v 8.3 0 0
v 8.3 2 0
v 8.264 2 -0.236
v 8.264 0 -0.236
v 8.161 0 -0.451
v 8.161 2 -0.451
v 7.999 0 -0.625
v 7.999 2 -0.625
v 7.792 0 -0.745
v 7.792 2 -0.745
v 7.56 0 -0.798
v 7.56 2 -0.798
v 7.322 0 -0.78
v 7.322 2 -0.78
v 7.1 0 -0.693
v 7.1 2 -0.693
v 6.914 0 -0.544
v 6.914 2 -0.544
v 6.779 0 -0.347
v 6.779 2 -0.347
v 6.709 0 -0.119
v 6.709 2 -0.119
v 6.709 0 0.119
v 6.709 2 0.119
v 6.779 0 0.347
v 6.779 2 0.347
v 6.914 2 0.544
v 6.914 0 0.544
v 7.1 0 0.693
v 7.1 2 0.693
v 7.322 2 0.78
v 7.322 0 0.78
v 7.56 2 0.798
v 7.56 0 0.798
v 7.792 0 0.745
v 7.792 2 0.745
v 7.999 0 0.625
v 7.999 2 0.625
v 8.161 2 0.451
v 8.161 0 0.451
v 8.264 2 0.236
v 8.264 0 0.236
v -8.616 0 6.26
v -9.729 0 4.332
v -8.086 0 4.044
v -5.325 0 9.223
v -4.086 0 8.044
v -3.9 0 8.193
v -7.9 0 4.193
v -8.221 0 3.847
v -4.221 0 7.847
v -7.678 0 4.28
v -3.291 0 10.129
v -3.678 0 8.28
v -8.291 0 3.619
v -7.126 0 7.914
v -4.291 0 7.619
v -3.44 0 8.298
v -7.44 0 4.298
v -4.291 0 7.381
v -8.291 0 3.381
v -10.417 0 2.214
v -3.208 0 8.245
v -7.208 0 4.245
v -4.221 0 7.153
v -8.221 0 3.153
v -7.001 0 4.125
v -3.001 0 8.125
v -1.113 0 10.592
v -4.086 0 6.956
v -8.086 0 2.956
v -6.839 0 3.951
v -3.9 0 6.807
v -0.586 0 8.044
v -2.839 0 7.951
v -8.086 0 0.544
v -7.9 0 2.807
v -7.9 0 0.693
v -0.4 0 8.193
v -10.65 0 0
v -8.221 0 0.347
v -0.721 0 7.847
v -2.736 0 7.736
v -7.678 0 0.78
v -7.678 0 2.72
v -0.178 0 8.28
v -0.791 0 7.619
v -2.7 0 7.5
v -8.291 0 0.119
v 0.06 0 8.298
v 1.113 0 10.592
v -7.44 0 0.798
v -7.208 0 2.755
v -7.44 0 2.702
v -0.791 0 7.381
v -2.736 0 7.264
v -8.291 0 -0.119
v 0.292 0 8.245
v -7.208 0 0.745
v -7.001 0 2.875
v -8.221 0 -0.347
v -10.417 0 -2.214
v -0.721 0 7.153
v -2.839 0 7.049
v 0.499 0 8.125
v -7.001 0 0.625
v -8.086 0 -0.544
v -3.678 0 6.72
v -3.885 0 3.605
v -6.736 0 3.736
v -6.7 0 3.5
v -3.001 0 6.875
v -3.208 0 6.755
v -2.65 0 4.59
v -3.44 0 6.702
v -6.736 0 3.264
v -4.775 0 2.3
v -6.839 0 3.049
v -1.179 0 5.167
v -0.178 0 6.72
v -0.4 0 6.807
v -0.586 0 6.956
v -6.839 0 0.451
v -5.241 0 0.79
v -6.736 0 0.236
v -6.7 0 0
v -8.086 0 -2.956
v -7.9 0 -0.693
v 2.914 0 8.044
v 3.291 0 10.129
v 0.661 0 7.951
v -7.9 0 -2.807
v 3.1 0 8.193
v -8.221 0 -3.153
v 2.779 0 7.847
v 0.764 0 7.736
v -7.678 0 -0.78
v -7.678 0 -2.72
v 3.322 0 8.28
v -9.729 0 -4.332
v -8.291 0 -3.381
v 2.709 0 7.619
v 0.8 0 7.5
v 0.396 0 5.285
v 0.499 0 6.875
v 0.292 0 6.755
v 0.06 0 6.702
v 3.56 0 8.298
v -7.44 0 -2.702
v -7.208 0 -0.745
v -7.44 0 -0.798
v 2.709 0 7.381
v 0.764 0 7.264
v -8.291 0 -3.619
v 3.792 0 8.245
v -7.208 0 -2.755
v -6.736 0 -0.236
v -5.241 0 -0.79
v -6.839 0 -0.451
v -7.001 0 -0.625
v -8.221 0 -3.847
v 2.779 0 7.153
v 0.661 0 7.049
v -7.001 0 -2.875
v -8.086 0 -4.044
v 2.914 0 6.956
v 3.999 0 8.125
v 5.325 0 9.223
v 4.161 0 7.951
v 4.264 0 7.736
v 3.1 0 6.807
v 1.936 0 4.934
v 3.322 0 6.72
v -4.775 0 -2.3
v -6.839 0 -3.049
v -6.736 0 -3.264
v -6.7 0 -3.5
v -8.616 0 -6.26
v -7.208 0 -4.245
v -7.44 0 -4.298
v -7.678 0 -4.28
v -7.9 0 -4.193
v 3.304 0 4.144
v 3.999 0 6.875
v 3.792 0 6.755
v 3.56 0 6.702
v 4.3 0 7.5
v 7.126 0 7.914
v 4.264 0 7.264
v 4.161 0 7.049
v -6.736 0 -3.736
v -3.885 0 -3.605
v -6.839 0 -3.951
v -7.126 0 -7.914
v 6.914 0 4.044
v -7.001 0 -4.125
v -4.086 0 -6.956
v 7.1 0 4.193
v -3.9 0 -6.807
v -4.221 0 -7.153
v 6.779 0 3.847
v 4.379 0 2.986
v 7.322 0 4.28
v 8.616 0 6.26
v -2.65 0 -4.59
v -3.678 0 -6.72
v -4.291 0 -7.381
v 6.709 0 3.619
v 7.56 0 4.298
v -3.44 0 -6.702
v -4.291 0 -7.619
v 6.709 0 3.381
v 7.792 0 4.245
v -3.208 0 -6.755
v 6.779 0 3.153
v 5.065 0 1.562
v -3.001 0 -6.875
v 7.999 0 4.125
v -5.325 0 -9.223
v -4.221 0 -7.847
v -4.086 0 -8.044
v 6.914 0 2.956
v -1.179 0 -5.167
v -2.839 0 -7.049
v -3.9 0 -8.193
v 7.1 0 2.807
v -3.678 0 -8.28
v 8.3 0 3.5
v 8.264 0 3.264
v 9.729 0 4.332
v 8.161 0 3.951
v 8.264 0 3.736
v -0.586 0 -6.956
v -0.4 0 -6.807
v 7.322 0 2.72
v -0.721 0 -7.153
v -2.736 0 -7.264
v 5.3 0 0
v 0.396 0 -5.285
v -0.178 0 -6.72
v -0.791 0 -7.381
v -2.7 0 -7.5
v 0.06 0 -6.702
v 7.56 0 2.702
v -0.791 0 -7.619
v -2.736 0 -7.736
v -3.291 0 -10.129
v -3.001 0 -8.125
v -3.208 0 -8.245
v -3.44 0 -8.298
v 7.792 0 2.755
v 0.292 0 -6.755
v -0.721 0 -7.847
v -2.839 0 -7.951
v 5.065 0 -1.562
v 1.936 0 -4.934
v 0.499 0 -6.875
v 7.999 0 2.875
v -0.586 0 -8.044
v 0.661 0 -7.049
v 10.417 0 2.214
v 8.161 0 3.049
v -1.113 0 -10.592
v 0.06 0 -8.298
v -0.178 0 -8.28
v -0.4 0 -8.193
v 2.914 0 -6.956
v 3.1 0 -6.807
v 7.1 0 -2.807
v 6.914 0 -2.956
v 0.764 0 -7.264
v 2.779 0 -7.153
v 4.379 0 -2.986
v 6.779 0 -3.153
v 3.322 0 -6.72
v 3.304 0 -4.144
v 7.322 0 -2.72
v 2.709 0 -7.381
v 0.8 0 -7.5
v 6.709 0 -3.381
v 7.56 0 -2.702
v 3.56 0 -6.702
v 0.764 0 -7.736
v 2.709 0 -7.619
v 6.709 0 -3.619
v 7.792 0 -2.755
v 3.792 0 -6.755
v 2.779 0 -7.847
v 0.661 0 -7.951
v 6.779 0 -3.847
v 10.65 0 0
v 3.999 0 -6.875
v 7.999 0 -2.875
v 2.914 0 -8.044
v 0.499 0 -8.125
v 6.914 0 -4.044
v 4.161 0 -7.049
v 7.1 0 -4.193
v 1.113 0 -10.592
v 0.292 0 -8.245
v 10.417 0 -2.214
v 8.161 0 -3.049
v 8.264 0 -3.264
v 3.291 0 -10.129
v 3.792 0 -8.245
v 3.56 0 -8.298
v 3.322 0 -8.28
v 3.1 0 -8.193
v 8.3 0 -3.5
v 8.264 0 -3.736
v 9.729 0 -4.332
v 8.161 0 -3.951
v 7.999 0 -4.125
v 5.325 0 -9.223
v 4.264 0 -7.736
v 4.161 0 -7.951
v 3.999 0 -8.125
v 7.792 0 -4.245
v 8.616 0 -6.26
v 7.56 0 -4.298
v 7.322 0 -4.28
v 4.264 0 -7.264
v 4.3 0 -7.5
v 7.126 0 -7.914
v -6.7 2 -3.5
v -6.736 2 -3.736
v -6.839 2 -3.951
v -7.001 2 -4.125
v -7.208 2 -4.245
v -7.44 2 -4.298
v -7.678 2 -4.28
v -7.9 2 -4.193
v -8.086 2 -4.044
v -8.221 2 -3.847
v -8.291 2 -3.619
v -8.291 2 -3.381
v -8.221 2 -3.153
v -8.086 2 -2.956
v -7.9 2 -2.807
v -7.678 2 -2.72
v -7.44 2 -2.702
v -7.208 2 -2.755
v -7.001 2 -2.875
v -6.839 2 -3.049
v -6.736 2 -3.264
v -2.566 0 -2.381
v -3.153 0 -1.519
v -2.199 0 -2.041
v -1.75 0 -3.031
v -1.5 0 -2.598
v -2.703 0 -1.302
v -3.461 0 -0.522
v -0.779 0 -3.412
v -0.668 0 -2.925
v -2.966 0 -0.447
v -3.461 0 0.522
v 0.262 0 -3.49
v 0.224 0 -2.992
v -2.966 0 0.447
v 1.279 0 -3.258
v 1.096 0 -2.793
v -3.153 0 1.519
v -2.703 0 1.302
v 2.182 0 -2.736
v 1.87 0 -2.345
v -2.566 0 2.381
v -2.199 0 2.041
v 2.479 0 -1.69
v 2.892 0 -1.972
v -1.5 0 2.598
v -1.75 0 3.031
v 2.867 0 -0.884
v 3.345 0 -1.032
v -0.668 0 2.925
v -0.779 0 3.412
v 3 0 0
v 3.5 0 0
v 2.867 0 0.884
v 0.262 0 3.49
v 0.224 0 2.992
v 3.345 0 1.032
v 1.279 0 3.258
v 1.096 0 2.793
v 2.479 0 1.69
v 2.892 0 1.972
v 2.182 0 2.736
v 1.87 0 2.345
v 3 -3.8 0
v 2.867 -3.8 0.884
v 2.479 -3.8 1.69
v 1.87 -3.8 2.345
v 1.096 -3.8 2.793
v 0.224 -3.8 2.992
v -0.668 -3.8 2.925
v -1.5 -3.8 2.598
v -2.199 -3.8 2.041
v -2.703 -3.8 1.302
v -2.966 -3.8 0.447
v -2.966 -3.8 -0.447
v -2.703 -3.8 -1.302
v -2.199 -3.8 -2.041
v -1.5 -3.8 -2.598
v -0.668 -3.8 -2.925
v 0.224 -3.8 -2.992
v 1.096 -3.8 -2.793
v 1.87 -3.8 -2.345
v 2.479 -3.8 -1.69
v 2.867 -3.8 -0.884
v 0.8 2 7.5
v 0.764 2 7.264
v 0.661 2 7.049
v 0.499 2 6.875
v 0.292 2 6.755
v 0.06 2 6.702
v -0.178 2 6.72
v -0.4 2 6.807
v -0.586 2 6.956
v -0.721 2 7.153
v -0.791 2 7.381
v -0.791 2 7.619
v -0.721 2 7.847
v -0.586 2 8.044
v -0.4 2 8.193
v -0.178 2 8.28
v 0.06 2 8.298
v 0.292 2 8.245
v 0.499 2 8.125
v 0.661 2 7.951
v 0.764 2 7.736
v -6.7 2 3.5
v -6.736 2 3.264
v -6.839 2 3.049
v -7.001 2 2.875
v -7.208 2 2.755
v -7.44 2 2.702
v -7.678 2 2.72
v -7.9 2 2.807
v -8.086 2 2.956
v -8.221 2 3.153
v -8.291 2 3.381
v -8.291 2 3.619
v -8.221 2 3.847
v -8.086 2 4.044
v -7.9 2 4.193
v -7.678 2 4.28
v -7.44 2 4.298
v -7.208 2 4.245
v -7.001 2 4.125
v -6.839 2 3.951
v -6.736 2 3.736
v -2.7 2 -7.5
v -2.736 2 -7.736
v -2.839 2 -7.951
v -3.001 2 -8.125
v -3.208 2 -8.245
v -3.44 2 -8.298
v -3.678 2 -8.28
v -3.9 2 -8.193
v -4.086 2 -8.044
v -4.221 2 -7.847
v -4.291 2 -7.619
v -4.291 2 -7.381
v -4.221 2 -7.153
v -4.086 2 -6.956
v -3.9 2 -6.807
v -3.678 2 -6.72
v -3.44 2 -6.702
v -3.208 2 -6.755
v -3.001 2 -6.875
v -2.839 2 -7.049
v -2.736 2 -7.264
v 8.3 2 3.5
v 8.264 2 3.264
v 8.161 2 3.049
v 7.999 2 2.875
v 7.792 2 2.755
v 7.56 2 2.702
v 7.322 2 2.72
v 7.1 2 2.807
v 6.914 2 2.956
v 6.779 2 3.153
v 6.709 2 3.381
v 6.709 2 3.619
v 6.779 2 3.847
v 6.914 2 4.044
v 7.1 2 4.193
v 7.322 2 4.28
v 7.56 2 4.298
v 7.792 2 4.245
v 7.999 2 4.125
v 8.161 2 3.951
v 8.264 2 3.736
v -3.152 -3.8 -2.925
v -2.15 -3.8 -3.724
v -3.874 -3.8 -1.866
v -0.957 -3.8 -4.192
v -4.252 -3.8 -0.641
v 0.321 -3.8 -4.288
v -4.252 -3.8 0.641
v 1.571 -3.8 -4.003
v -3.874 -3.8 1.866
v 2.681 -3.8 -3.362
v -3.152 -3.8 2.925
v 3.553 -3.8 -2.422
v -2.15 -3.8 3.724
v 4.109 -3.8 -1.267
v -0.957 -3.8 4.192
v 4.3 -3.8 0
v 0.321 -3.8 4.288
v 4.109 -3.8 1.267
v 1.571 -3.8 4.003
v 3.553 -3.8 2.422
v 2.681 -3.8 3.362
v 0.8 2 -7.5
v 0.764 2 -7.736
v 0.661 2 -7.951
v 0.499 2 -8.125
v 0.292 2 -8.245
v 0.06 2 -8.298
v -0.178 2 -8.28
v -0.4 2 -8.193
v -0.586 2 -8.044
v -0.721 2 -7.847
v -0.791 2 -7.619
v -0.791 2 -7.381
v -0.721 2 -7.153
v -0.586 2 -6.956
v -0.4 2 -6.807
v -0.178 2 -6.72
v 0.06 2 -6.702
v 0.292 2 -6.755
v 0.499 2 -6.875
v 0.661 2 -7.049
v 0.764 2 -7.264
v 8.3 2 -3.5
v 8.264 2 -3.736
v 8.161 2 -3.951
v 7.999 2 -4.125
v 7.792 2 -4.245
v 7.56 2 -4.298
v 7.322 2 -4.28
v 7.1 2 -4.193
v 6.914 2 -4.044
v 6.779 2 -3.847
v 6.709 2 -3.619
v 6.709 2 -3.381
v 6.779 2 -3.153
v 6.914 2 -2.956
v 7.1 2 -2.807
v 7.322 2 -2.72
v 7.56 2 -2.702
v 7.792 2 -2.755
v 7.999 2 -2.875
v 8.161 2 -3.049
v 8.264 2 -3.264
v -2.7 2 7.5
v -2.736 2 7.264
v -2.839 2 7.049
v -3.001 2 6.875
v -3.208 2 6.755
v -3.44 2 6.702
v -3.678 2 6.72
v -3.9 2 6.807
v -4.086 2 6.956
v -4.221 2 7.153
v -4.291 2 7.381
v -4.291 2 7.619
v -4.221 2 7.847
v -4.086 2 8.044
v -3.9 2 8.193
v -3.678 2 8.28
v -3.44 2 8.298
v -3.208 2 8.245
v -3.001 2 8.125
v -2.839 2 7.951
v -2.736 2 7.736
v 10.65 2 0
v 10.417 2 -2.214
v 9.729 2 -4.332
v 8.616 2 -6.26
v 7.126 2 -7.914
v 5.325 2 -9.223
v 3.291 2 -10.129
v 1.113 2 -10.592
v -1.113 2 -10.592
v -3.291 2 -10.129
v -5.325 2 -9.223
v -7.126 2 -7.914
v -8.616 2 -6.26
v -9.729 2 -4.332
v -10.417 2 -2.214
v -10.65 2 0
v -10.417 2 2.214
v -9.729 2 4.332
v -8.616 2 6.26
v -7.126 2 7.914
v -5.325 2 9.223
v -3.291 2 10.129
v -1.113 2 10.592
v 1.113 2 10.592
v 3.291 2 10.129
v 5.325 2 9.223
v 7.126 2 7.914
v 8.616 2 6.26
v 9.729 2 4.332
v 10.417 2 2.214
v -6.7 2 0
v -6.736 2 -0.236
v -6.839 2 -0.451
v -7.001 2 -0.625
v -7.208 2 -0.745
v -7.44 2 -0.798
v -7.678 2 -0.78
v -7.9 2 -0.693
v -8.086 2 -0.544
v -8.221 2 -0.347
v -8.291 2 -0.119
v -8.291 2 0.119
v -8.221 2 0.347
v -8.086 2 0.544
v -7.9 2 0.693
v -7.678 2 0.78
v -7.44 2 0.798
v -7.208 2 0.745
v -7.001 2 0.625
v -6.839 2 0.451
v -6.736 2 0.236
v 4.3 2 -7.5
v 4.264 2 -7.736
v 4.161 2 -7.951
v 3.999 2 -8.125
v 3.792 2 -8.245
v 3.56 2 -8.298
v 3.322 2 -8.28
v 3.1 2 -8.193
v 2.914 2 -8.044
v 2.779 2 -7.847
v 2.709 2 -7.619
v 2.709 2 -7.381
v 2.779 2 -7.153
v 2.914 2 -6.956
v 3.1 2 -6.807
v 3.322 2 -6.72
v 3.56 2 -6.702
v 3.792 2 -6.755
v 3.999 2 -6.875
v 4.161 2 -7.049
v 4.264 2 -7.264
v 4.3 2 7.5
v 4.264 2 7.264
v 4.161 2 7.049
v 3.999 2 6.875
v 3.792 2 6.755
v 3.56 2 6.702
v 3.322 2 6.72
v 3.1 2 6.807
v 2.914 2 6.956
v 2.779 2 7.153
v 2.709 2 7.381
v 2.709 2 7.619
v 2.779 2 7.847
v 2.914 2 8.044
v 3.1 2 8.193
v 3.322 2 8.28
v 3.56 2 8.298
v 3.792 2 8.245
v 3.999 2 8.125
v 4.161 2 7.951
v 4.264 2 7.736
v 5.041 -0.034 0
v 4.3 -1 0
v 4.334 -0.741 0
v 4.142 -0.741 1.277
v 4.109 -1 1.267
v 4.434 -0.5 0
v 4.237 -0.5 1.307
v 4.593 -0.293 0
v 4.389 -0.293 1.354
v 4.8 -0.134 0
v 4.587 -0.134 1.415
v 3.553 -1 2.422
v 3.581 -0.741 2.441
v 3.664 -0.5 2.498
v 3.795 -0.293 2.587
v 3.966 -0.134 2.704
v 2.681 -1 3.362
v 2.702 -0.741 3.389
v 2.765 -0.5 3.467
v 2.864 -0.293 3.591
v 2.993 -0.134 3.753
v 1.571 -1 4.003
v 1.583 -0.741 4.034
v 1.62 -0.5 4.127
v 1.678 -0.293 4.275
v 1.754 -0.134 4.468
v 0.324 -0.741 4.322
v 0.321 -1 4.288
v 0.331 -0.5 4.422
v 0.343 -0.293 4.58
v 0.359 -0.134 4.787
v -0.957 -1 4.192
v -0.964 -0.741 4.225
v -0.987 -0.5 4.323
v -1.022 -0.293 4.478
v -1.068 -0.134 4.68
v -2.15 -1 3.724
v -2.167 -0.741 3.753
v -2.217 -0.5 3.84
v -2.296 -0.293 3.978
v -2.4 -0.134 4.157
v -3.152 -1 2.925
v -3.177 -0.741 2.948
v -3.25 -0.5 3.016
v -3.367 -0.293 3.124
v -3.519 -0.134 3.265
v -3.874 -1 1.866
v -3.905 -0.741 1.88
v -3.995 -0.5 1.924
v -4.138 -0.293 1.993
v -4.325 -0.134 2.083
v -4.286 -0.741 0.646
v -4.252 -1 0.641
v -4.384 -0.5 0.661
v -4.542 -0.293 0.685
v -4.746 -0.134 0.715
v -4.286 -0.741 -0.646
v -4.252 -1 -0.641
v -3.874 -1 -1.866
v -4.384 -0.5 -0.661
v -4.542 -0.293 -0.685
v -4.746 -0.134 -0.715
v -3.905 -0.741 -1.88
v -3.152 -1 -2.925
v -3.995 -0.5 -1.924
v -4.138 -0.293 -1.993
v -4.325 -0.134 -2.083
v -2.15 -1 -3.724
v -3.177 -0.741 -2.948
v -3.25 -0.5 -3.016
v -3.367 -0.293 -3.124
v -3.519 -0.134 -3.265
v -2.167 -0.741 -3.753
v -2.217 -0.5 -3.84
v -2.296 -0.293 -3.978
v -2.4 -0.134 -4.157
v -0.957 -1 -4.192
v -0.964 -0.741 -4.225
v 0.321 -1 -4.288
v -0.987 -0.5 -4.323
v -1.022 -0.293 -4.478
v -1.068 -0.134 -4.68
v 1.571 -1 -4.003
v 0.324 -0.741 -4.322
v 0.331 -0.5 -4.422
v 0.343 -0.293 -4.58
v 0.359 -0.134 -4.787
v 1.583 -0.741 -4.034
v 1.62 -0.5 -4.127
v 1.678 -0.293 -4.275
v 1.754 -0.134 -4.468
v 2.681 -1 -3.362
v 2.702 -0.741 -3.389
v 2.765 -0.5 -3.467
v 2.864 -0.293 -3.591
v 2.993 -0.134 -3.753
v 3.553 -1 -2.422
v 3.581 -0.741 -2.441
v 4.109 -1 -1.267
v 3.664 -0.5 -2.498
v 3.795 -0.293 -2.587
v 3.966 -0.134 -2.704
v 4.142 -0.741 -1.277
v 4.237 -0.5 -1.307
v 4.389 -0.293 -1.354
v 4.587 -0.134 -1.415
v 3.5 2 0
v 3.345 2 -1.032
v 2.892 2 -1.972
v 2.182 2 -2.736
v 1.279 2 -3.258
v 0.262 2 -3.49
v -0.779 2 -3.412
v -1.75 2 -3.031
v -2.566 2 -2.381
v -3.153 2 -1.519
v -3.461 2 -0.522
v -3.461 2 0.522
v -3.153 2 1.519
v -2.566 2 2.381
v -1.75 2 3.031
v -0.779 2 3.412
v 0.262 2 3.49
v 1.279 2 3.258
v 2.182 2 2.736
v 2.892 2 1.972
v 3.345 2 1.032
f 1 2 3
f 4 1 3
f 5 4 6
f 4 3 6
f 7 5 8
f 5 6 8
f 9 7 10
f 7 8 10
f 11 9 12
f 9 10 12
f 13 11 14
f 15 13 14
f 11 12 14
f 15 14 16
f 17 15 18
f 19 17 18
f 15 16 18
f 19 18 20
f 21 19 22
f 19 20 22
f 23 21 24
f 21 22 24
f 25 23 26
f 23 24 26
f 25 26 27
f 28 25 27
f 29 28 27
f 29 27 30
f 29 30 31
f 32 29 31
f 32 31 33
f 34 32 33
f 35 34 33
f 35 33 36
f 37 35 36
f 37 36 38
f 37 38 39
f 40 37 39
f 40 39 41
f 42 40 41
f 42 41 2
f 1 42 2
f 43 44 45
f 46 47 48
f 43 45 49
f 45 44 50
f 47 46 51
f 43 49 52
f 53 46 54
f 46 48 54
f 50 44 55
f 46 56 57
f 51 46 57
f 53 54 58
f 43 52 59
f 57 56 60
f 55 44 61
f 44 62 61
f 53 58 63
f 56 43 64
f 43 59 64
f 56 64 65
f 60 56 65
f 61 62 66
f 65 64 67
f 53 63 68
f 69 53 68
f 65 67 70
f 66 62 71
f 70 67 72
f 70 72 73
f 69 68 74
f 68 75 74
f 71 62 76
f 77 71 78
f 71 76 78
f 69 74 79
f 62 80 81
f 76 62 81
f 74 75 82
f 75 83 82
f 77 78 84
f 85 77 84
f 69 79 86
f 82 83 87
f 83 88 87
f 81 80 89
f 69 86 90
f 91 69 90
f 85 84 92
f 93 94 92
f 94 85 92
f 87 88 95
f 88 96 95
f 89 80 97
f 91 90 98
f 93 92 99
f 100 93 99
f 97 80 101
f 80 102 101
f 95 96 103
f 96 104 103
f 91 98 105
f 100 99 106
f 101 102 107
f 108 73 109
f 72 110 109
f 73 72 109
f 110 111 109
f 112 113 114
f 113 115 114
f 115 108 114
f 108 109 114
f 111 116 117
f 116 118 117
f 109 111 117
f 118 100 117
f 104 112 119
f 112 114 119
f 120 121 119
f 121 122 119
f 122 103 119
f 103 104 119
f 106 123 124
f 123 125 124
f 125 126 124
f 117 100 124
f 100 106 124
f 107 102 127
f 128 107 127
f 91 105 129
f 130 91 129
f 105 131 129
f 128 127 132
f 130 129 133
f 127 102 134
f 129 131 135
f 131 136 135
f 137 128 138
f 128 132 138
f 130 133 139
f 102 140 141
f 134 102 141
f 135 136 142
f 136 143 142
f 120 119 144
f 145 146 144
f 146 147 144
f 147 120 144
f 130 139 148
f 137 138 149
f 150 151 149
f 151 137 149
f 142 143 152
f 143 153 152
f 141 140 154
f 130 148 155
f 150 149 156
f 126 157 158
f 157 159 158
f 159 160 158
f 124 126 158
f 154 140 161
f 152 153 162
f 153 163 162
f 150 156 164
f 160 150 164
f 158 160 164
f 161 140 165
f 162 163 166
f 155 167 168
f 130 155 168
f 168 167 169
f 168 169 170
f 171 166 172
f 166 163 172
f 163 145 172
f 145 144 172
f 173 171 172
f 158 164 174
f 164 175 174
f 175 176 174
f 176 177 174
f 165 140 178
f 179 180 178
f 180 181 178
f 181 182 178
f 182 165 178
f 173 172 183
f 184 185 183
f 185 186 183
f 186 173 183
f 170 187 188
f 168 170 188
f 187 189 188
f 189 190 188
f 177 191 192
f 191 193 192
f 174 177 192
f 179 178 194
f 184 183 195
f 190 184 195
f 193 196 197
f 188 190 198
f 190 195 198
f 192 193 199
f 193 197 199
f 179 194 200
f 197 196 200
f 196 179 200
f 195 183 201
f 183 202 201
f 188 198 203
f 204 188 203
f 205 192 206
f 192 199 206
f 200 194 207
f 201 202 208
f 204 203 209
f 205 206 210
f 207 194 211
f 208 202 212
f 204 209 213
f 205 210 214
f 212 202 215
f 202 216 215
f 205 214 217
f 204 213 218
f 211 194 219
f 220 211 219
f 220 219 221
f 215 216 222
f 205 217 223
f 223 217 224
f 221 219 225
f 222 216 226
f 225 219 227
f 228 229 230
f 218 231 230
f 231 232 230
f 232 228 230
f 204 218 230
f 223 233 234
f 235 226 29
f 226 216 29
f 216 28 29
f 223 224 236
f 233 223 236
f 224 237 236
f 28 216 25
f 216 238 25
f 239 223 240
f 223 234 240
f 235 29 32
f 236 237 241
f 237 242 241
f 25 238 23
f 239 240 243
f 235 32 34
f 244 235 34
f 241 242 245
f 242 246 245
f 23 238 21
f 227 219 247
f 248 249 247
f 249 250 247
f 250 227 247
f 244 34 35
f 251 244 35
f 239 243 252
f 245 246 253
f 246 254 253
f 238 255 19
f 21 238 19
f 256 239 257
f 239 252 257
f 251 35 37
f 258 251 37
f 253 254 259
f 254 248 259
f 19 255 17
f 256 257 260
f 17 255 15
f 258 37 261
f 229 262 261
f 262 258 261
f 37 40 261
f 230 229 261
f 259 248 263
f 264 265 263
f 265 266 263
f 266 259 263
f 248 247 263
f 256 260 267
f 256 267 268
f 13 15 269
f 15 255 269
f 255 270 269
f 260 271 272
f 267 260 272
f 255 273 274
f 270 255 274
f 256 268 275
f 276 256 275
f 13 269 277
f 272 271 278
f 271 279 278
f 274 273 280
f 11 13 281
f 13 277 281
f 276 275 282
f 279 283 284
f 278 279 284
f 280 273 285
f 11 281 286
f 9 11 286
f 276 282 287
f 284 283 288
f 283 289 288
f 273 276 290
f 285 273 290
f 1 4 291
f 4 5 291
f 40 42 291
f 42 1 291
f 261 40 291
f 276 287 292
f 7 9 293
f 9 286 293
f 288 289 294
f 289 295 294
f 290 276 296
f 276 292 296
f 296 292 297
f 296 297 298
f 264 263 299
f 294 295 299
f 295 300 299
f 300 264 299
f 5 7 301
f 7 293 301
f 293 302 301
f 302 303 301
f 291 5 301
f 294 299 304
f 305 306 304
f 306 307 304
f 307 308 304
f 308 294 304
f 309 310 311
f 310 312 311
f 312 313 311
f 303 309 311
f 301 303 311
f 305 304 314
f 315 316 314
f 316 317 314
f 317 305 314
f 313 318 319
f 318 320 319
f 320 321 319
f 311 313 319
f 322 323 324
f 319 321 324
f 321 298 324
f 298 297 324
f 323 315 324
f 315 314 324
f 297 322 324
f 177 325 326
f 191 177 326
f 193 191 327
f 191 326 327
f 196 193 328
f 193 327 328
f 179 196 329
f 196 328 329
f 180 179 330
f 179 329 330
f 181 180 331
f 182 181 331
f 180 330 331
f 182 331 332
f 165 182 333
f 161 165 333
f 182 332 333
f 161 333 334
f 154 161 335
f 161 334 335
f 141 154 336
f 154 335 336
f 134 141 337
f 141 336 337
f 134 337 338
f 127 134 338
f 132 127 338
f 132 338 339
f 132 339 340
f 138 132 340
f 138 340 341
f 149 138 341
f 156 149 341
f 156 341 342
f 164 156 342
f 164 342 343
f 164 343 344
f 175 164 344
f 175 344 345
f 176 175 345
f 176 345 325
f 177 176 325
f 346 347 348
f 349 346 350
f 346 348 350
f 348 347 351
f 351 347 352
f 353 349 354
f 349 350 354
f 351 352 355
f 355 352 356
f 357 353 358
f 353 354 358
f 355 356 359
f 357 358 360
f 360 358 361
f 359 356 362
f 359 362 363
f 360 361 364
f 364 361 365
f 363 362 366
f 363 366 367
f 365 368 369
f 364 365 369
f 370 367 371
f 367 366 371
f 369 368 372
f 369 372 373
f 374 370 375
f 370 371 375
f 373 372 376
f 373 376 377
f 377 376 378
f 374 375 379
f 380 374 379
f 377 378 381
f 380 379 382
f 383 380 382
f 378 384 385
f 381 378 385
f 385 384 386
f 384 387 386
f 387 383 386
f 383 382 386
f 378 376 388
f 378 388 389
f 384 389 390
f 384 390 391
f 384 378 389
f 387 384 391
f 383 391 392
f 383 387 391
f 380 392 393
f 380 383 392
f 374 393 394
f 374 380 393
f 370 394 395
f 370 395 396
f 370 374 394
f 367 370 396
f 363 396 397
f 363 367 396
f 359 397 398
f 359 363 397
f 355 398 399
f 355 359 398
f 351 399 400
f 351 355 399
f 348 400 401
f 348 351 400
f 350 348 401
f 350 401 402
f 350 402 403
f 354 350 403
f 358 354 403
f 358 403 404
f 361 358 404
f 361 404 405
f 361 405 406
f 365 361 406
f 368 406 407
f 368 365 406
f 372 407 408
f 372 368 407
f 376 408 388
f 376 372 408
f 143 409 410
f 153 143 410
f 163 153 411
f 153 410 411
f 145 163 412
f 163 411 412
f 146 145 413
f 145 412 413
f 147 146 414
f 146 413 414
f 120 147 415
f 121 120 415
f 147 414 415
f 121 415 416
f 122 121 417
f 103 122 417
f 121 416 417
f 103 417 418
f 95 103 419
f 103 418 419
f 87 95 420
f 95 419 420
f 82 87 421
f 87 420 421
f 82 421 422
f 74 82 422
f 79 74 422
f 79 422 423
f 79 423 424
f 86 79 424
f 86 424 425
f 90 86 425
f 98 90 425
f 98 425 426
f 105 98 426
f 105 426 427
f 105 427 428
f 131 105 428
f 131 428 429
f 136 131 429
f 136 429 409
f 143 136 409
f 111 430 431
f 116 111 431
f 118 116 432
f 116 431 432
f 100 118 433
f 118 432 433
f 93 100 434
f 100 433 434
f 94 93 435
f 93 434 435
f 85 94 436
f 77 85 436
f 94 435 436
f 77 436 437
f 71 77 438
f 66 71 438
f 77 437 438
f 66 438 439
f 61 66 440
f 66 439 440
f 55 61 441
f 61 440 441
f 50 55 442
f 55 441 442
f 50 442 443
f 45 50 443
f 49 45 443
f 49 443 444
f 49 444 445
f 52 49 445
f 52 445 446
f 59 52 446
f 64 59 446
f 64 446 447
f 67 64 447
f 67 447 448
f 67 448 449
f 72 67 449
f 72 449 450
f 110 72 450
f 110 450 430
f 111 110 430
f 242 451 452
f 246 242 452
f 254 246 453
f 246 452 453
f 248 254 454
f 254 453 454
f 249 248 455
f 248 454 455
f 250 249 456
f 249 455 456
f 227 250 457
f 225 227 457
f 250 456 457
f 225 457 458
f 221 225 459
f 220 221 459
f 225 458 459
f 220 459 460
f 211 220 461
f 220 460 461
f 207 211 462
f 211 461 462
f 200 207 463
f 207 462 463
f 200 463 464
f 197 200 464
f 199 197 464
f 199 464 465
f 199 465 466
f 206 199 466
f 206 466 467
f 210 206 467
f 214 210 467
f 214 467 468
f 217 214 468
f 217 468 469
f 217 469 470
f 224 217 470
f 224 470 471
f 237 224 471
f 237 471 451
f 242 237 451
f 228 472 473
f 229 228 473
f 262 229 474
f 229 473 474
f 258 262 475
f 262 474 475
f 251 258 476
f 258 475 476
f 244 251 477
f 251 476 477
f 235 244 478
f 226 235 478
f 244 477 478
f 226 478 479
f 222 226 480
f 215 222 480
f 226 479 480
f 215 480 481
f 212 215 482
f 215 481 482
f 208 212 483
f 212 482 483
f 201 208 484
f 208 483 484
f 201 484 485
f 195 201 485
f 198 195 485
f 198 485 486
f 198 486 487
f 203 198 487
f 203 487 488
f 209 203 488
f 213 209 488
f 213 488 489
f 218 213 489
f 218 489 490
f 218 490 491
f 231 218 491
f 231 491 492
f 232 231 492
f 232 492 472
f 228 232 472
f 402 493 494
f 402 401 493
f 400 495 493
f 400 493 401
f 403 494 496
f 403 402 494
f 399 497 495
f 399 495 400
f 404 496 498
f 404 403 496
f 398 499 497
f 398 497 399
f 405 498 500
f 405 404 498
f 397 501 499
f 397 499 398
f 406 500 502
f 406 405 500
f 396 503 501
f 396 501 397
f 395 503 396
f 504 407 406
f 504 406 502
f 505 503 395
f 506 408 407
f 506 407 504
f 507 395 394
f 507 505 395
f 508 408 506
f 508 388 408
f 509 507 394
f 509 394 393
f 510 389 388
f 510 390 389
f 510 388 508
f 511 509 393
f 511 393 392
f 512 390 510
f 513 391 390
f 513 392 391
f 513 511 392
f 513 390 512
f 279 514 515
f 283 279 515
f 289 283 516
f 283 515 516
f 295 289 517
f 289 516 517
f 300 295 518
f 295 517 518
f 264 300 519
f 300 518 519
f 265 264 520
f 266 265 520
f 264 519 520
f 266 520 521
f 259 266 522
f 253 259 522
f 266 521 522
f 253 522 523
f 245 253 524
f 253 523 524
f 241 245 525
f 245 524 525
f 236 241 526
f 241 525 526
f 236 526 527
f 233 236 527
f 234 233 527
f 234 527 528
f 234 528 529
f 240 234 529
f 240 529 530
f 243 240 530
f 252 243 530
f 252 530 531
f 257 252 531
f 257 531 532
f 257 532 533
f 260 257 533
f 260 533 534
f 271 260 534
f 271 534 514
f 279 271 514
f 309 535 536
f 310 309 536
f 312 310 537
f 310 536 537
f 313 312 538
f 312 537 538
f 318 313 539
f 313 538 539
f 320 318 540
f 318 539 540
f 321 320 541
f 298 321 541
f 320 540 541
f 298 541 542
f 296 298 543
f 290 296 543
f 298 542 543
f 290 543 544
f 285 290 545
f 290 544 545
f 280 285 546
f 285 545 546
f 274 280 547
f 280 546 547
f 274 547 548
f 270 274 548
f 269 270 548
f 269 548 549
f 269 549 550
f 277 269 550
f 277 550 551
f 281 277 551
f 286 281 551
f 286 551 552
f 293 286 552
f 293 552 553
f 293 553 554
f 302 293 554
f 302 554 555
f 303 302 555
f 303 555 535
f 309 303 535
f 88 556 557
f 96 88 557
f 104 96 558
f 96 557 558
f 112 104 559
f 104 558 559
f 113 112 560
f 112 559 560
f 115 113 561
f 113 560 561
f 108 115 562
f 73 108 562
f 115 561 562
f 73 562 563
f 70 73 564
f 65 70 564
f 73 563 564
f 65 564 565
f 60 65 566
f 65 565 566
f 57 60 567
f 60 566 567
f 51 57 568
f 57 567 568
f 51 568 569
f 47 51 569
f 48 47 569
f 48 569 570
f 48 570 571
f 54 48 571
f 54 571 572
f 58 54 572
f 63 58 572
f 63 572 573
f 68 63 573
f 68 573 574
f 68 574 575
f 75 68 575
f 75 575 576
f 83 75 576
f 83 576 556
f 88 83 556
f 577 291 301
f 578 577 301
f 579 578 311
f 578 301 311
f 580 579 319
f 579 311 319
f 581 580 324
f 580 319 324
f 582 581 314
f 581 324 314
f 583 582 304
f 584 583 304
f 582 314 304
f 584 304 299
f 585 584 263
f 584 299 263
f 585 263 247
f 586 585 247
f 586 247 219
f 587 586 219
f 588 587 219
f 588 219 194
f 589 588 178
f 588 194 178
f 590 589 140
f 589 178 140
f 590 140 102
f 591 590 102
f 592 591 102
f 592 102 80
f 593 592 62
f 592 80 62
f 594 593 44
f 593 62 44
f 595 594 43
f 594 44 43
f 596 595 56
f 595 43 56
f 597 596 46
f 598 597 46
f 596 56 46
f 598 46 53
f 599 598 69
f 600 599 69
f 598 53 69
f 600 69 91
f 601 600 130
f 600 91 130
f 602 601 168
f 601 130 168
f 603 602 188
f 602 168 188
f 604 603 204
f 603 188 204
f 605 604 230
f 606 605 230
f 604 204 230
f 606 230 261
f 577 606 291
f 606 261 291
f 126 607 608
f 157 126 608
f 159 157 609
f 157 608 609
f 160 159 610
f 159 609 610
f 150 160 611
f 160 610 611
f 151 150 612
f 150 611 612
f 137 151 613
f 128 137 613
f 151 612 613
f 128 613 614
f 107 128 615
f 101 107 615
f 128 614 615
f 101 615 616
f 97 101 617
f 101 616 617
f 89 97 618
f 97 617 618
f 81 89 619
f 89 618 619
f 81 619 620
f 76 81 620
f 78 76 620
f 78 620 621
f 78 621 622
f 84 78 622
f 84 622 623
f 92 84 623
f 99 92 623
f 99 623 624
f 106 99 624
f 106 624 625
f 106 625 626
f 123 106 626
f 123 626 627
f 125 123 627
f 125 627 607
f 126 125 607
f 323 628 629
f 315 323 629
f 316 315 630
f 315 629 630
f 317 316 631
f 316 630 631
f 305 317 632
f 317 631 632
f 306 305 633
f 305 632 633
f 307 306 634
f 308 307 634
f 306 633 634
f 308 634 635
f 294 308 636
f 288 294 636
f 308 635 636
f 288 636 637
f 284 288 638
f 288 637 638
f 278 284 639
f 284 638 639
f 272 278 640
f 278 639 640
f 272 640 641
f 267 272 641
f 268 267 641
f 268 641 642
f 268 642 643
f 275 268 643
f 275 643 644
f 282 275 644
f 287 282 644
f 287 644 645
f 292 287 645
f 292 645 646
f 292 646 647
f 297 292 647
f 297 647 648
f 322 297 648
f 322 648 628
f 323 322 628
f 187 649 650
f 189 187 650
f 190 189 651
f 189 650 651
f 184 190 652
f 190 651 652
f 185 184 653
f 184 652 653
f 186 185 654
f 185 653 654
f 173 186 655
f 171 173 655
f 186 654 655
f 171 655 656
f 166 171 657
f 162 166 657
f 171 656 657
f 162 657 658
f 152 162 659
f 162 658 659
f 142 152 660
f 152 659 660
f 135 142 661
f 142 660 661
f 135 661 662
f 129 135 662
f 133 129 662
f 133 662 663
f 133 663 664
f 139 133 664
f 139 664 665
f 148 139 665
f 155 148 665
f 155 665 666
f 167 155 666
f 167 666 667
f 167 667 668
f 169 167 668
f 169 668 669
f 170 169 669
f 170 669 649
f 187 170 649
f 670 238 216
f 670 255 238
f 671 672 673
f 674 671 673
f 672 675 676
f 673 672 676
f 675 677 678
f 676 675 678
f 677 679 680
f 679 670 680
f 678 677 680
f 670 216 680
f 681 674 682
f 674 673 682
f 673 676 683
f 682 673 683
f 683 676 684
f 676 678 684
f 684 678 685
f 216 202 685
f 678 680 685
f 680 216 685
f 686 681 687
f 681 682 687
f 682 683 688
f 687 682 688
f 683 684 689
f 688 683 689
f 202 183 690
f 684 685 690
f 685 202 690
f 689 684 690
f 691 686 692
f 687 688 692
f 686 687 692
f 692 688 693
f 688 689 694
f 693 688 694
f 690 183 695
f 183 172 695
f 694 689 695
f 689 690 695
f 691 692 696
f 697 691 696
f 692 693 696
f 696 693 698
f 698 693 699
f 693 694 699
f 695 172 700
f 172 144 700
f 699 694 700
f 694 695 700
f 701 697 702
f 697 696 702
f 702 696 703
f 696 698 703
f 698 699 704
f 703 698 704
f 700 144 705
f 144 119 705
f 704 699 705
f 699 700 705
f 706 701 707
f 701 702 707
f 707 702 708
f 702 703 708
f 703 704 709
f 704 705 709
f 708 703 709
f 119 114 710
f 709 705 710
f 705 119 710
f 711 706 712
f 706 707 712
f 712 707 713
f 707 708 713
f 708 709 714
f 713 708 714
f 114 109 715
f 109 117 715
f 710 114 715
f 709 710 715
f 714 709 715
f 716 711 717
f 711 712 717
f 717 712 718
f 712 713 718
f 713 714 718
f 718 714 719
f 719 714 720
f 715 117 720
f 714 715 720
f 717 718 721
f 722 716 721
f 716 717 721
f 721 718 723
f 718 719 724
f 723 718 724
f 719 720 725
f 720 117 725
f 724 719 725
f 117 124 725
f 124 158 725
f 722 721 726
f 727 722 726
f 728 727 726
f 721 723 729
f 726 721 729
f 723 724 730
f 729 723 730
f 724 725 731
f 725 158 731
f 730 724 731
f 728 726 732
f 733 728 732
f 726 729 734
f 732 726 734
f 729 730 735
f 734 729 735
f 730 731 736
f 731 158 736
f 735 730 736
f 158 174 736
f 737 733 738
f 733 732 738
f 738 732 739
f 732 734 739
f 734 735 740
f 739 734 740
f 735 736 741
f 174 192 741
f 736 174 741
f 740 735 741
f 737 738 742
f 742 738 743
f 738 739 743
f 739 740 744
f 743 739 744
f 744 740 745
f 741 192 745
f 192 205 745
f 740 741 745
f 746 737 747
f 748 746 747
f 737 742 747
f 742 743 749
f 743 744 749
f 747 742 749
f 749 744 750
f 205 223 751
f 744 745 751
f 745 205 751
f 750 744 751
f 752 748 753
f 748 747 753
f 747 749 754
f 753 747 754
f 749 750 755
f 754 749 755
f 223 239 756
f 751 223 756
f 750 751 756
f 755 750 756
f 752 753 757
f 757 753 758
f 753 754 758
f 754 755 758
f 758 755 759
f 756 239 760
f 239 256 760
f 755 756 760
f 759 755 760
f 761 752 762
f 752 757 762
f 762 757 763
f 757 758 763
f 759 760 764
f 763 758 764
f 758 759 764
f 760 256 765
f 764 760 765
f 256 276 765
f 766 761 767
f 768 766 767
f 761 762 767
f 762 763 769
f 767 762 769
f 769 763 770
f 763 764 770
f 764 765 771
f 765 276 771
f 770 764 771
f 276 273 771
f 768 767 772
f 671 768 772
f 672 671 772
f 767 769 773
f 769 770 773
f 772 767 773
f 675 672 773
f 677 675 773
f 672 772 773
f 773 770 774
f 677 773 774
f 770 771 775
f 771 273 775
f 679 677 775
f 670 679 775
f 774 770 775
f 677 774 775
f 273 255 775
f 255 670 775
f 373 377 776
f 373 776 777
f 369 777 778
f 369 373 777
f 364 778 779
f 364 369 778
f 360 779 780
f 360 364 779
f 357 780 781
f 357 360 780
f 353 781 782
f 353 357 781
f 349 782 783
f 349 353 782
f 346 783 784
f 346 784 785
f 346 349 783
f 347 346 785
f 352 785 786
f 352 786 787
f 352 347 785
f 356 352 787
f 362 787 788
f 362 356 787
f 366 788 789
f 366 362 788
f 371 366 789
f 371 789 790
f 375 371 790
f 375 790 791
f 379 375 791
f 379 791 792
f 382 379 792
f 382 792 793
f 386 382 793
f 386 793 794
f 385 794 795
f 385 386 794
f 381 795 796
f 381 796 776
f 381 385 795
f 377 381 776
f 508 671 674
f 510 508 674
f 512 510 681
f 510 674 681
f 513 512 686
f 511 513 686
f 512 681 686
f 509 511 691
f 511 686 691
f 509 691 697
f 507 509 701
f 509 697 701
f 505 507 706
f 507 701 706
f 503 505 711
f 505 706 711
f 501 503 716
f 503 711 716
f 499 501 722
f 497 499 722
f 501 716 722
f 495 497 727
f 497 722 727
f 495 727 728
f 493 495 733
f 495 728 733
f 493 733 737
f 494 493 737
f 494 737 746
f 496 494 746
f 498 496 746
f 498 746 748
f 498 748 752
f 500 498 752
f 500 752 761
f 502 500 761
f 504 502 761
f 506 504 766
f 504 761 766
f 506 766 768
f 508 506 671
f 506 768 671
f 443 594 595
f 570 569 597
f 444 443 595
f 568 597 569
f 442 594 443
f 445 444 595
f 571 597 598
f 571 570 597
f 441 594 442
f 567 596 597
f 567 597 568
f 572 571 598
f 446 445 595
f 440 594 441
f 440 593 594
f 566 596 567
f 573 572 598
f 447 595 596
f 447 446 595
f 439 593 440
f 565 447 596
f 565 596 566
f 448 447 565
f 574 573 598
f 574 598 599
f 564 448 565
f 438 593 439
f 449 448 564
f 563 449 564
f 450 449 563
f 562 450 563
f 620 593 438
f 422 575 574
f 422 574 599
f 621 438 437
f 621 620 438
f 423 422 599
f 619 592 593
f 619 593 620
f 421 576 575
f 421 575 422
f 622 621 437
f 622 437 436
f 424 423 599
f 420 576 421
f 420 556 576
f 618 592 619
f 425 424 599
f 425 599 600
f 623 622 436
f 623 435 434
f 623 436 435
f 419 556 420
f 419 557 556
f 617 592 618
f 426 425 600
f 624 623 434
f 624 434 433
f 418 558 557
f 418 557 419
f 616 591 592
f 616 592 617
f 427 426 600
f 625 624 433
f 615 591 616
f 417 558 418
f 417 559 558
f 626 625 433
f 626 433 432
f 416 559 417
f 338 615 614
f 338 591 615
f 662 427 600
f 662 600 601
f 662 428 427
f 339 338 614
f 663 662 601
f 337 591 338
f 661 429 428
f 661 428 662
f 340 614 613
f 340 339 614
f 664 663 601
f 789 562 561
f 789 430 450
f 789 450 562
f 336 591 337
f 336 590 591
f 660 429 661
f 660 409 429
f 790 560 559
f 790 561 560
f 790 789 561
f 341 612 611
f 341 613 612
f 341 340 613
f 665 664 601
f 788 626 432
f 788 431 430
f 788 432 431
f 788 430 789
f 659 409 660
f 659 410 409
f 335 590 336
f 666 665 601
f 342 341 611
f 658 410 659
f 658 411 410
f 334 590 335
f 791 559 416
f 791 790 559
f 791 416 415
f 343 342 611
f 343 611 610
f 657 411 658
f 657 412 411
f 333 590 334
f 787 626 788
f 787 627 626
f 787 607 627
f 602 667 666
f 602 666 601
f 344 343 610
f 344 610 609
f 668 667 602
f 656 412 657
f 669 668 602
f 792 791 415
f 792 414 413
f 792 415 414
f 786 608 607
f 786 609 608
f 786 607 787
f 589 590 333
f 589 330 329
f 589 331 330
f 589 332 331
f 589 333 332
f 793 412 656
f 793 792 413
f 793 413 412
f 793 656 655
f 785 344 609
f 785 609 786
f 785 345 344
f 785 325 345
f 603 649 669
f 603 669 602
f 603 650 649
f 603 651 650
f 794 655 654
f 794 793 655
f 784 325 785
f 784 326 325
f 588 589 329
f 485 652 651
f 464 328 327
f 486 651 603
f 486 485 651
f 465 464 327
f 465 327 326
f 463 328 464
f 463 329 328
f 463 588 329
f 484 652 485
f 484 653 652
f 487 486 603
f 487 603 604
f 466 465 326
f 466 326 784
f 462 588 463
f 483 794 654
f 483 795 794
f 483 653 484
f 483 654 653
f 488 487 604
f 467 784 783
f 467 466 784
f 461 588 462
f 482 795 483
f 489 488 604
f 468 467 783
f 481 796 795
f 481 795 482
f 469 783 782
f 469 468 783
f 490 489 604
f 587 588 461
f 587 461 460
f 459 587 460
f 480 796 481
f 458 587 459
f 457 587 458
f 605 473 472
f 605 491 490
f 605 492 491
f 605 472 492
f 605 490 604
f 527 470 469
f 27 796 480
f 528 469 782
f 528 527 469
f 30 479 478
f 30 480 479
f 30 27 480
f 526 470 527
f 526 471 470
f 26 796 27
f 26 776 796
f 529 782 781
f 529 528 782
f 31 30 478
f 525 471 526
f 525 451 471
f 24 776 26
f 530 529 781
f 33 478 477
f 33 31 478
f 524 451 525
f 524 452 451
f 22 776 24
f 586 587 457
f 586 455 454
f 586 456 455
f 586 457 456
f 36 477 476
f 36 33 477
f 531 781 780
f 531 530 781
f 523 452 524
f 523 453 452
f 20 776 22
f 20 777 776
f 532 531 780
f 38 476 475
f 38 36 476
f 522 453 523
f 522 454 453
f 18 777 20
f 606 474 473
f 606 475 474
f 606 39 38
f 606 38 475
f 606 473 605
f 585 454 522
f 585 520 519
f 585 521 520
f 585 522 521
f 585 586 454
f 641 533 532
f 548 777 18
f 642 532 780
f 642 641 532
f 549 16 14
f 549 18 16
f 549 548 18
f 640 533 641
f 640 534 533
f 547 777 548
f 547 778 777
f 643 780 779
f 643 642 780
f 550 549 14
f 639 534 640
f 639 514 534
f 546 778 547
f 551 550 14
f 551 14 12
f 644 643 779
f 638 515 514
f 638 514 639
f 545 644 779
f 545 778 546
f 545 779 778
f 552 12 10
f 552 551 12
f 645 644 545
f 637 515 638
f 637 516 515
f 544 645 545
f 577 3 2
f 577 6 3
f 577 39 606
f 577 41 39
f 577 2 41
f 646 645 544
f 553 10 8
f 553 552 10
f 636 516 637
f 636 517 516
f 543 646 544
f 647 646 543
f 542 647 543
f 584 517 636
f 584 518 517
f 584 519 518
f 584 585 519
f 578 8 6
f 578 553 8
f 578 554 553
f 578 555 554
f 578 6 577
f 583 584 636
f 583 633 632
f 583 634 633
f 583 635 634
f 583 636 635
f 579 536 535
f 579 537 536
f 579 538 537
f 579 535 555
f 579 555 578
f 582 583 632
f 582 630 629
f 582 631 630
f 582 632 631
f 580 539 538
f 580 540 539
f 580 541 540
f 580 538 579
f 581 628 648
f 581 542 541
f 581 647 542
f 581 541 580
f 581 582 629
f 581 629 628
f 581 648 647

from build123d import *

# Parameters (mm, degrees)
SKETCH_1_R          = 10.65
SKETCH_1_R_2        = 3.5
EXTRUDE_1_DEPTH     = 2
SKETCH_2_R          = 4.3
SKETCH_2_R_2        = 3
EXTRUDE_2_DEPTH     = 3.8
FILLET_1_R          = 1
CUT_EXTRUDE_1_REACH = 7.8
SKETCH_3_R          = 0.8


with BuildPart() as part:
    # Эскиз1 → Бобышка-Вытянуть1 (new body)
    with BuildSketch(Plane(origin=(0, 0, 0), x_dir=(1, 0, 0), z_dir=(0, 1, 0))):
        Circle(SKETCH_1_R)
        Circle(SKETCH_1_R_2, mode=Mode.SUBTRACT)
    extrude(amount=EXTRUDE_1_DEPTH)

    # Эскиз2 → Бобышка-Вытянуть2 (add)
    with BuildSketch(Plane.XZ):
        Circle(SKETCH_2_R)
        Circle(SKETCH_2_R_2, mode=Mode.SUBTRACT)
    extrude(amount=EXTRUDE_2_DEPTH)

    # Скругление1
    fillet_1_edges = [part.edges().sort_by_distance(p)[0] for p in [
        (-4.3, 0, 0),
    ]]
    fillet(fillet_1_edges, radius=FILLET_1_R)

    # Эскиз3 → Вырез-Вытянуть1 (cut, up to next)
    with BuildSketch(Plane(origin=(0, 2, 0), x_dir=(1, 0, 0), z_dir=(0, 1, 0)), mode=Mode.PRIVATE) as cut_extrude_1_sk1:
        with Locations((-3.5, 7.5)):
            Circle(SKETCH_3_R)
    cut_extrude_1_tool1 = extrude(cut_extrude_1_sk1.sketch, amount=-CUT_EXTRUDE_1_REACH, mode=Mode.PRIVATE) & part.part
    add(cut_extrude_1_tool1.solids().sort_by_distance((-3.5, 2, -7.5))[0], mode=Mode.SUBTRACT)
    # Эскиз3 → Вырез-Вытянуть1 (cut, up to next)
    with BuildSketch(Plane(origin=(0, 2, 0), x_dir=(1, 0, 0), z_dir=(0, 1, 0)), mode=Mode.PRIVATE) as cut_extrude_1_sk2:
        with Locations((0, 7.5)):
            Circle(SKETCH_3_R)
    cut_extrude_1_tool2 = extrude(cut_extrude_1_sk2.sketch, amount=-CUT_EXTRUDE_1_REACH, mode=Mode.PRIVATE) & part.part
    add(cut_extrude_1_tool2.solids().sort_by_distance((0, 2, -7.5))[0], mode=Mode.SUBTRACT)
    # Эскиз3 → Вырез-Вытянуть1 (cut, up to next)
    with BuildSketch(Plane(origin=(0, 2, 0), x_dir=(1, 0, 0), z_dir=(0, 1, 0)), mode=Mode.PRIVATE) as cut_extrude_1_sk3:
        with Locations((3.5, 7.5)):
            Circle(SKETCH_3_R)
    cut_extrude_1_tool3 = extrude(cut_extrude_1_sk3.sketch, amount=-CUT_EXTRUDE_1_REACH, mode=Mode.PRIVATE) & part.part
    add(cut_extrude_1_tool3.solids().sort_by_distance((3.5, 2, -7.5))[0], mode=Mode.SUBTRACT)
    # Эскиз3 → Вырез-Вытянуть1 (cut, up to next)
    with BuildSketch(Plane(origin=(0, 2, 0), x_dir=(1, 0, 0), z_dir=(0, 1, 0)), mode=Mode.PRIVATE) as cut_extrude_1_sk4:
        with Locations((7.5, 3.5)):
            Circle(SKETCH_3_R)
    cut_extrude_1_tool4 = extrude(cut_extrude_1_sk4.sketch, amount=-CUT_EXTRUDE_1_REACH, mode=Mode.PRIVATE) & part.part
    add(cut_extrude_1_tool4.solids().sort_by_distance((7.5, 2, -3.5))[0], mode=Mode.SUBTRACT)
    # Эскиз3 → Вырез-Вытянуть1 (cut, up to next)
    with BuildSketch(Plane(origin=(0, 2, 0), x_dir=(1, 0, 0), z_dir=(0, 1, 0)), mode=Mode.PRIVATE) as cut_extrude_1_sk5:
        with Locations((7.5, 0)):
            Circle(SKETCH_3_R)
    cut_extrude_1_tool5 = extrude(cut_extrude_1_sk5.sketch, amount=-CUT_EXTRUDE_1_REACH, mode=Mode.PRIVATE) & part.part
    add(cut_extrude_1_tool5.solids().sort_by_distance((7.5, 2, 0))[0], mode=Mode.SUBTRACT)
    # Эскиз3 → Вырез-Вытянуть1 (cut, up to next)
    with BuildSketch(Plane(origin=(0, 2, 0), x_dir=(1, 0, 0), z_dir=(0, 1, 0)), mode=Mode.PRIVATE) as cut_extrude_1_sk6:
        with Locations((7.5, -3.5)):
            Circle(SKETCH_3_R)
    cut_extrude_1_tool6 = extrude(cut_extrude_1_sk6.sketch, amount=-CUT_EXTRUDE_1_REACH, mode=Mode.PRIVATE) & part.part
    add(cut_extrude_1_tool6.solids().sort_by_distance((7.5, 2, 3.5))[0], mode=Mode.SUBTRACT)
    # Эскиз3 → Вырез-Вытянуть1 (cut, up to next)
    with BuildSketch(Plane(origin=(0, 2, 0), x_dir=(1, 0, 0), z_dir=(0, 1, 0)), mode=Mode.PRIVATE) as cut_extrude_1_sk7:
        with Locations((3.5, -7.5)):
            Circle(SKETCH_3_R)
    cut_extrude_1_tool7 = extrude(cut_extrude_1_sk7.sketch, amount=-CUT_EXTRUDE_1_REACH, mode=Mode.PRIVATE) & part.part
    add(cut_extrude_1_tool7.solids().sort_by_distance((3.5, 2, 7.5))[0], mode=Mode.SUBTRACT)
    # Эскиз3 → Вырез-Вытянуть1 (cut, up to next)
    with BuildSketch(Plane(origin=(0, 2, 0), x_dir=(1, 0, 0), z_dir=(0, 1, 0)), mode=Mode.PRIVATE) as cut_extrude_1_sk8:
        with Locations((0, -7.5)):
            Circle(SKETCH_3_R)
    cut_extrude_1_tool8 = extrude(cut_extrude_1_sk8.sketch, amount=-CUT_EXTRUDE_1_REACH, mode=Mode.PRIVATE) & part.part
    add(cut_extrude_1_tool8.solids().sort_by_distance((0, 2, 7.5))[0], mode=Mode.SUBTRACT)
    # Эскиз3 → Вырез-Вытянуть1 (cut, up to next)
    with BuildSketch(Plane(origin=(0, 2, 0), x_dir=(1, 0, 0), z_dir=(0, 1, 0)), mode=Mode.PRIVATE) as cut_extrude_1_sk9:
        with Locations((-3.5, -7.5)):
            Circle(SKETCH_3_R)
    cut_extrude_1_tool9 = extrude(cut_extrude_1_sk9.sketch, amount=-CUT_EXTRUDE_1_REACH, mode=Mode.PRIVATE) & part.part
    add(cut_extrude_1_tool9.solids().sort_by_distance((-3.5, 2, 7.5))[0], mode=Mode.SUBTRACT)
    # Эскиз3 → Вырез-Вытянуть1 (cut, up to next)
    with BuildSketch(Plane(origin=(0, 2, 0), x_dir=(1, 0, 0), z_dir=(0, 1, 0)), mode=Mode.PRIVATE) as cut_extrude_1_sk10:
        with Locations((-7.5, -3.5)):
            Circle(SKETCH_3_R)
    cut_extrude_1_tool10 = extrude(cut_extrude_1_sk10.sketch, amount=-CUT_EXTRUDE_1_REACH, mode=Mode.PRIVATE) & part.part
    add(cut_extrude_1_tool10.solids().sort_by_distance((-7.5, 2, 3.5))[0], mode=Mode.SUBTRACT)
    # Эскиз3 → Вырез-Вытянуть1 (cut, up to next)
    with BuildSketch(Plane(origin=(0, 2, 0), x_dir=(1, 0, 0), z_dir=(0, 1, 0)), mode=Mode.PRIVATE) as cut_extrude_1_sk11:
        with Locations((-7.5, 0)):
            Circle(SKETCH_3_R)
    cut_extrude_1_tool11 = extrude(cut_extrude_1_sk11.sketch, amount=-CUT_EXTRUDE_1_REACH, mode=Mode.PRIVATE) & part.part
    add(cut_extrude_1_tool11.solids().sort_by_distance((-7.5, 2, 0))[0], mode=Mode.SUBTRACT)
    # Эскиз3 → Вырез-Вытянуть1 (cut, up to next)
    with BuildSketch(Plane(origin=(0, 2, 0), x_dir=(1, 0, 0), z_dir=(0, 1, 0)), mode=Mode.PRIVATE) as cut_extrude_1_sk12:
        with Locations((-7.5, 3.5)):
            Circle(SKETCH_3_R)
    cut_extrude_1_tool12 = extrude(cut_extrude_1_sk12.sketch, amount=-CUT_EXTRUDE_1_REACH, mode=Mode.PRIVATE) & part.part
    add(cut_extrude_1_tool12.solids().sort_by_distance((-7.5, 2, -3.5))[0], mode=Mode.SUBTRACT)


solid = part.part
